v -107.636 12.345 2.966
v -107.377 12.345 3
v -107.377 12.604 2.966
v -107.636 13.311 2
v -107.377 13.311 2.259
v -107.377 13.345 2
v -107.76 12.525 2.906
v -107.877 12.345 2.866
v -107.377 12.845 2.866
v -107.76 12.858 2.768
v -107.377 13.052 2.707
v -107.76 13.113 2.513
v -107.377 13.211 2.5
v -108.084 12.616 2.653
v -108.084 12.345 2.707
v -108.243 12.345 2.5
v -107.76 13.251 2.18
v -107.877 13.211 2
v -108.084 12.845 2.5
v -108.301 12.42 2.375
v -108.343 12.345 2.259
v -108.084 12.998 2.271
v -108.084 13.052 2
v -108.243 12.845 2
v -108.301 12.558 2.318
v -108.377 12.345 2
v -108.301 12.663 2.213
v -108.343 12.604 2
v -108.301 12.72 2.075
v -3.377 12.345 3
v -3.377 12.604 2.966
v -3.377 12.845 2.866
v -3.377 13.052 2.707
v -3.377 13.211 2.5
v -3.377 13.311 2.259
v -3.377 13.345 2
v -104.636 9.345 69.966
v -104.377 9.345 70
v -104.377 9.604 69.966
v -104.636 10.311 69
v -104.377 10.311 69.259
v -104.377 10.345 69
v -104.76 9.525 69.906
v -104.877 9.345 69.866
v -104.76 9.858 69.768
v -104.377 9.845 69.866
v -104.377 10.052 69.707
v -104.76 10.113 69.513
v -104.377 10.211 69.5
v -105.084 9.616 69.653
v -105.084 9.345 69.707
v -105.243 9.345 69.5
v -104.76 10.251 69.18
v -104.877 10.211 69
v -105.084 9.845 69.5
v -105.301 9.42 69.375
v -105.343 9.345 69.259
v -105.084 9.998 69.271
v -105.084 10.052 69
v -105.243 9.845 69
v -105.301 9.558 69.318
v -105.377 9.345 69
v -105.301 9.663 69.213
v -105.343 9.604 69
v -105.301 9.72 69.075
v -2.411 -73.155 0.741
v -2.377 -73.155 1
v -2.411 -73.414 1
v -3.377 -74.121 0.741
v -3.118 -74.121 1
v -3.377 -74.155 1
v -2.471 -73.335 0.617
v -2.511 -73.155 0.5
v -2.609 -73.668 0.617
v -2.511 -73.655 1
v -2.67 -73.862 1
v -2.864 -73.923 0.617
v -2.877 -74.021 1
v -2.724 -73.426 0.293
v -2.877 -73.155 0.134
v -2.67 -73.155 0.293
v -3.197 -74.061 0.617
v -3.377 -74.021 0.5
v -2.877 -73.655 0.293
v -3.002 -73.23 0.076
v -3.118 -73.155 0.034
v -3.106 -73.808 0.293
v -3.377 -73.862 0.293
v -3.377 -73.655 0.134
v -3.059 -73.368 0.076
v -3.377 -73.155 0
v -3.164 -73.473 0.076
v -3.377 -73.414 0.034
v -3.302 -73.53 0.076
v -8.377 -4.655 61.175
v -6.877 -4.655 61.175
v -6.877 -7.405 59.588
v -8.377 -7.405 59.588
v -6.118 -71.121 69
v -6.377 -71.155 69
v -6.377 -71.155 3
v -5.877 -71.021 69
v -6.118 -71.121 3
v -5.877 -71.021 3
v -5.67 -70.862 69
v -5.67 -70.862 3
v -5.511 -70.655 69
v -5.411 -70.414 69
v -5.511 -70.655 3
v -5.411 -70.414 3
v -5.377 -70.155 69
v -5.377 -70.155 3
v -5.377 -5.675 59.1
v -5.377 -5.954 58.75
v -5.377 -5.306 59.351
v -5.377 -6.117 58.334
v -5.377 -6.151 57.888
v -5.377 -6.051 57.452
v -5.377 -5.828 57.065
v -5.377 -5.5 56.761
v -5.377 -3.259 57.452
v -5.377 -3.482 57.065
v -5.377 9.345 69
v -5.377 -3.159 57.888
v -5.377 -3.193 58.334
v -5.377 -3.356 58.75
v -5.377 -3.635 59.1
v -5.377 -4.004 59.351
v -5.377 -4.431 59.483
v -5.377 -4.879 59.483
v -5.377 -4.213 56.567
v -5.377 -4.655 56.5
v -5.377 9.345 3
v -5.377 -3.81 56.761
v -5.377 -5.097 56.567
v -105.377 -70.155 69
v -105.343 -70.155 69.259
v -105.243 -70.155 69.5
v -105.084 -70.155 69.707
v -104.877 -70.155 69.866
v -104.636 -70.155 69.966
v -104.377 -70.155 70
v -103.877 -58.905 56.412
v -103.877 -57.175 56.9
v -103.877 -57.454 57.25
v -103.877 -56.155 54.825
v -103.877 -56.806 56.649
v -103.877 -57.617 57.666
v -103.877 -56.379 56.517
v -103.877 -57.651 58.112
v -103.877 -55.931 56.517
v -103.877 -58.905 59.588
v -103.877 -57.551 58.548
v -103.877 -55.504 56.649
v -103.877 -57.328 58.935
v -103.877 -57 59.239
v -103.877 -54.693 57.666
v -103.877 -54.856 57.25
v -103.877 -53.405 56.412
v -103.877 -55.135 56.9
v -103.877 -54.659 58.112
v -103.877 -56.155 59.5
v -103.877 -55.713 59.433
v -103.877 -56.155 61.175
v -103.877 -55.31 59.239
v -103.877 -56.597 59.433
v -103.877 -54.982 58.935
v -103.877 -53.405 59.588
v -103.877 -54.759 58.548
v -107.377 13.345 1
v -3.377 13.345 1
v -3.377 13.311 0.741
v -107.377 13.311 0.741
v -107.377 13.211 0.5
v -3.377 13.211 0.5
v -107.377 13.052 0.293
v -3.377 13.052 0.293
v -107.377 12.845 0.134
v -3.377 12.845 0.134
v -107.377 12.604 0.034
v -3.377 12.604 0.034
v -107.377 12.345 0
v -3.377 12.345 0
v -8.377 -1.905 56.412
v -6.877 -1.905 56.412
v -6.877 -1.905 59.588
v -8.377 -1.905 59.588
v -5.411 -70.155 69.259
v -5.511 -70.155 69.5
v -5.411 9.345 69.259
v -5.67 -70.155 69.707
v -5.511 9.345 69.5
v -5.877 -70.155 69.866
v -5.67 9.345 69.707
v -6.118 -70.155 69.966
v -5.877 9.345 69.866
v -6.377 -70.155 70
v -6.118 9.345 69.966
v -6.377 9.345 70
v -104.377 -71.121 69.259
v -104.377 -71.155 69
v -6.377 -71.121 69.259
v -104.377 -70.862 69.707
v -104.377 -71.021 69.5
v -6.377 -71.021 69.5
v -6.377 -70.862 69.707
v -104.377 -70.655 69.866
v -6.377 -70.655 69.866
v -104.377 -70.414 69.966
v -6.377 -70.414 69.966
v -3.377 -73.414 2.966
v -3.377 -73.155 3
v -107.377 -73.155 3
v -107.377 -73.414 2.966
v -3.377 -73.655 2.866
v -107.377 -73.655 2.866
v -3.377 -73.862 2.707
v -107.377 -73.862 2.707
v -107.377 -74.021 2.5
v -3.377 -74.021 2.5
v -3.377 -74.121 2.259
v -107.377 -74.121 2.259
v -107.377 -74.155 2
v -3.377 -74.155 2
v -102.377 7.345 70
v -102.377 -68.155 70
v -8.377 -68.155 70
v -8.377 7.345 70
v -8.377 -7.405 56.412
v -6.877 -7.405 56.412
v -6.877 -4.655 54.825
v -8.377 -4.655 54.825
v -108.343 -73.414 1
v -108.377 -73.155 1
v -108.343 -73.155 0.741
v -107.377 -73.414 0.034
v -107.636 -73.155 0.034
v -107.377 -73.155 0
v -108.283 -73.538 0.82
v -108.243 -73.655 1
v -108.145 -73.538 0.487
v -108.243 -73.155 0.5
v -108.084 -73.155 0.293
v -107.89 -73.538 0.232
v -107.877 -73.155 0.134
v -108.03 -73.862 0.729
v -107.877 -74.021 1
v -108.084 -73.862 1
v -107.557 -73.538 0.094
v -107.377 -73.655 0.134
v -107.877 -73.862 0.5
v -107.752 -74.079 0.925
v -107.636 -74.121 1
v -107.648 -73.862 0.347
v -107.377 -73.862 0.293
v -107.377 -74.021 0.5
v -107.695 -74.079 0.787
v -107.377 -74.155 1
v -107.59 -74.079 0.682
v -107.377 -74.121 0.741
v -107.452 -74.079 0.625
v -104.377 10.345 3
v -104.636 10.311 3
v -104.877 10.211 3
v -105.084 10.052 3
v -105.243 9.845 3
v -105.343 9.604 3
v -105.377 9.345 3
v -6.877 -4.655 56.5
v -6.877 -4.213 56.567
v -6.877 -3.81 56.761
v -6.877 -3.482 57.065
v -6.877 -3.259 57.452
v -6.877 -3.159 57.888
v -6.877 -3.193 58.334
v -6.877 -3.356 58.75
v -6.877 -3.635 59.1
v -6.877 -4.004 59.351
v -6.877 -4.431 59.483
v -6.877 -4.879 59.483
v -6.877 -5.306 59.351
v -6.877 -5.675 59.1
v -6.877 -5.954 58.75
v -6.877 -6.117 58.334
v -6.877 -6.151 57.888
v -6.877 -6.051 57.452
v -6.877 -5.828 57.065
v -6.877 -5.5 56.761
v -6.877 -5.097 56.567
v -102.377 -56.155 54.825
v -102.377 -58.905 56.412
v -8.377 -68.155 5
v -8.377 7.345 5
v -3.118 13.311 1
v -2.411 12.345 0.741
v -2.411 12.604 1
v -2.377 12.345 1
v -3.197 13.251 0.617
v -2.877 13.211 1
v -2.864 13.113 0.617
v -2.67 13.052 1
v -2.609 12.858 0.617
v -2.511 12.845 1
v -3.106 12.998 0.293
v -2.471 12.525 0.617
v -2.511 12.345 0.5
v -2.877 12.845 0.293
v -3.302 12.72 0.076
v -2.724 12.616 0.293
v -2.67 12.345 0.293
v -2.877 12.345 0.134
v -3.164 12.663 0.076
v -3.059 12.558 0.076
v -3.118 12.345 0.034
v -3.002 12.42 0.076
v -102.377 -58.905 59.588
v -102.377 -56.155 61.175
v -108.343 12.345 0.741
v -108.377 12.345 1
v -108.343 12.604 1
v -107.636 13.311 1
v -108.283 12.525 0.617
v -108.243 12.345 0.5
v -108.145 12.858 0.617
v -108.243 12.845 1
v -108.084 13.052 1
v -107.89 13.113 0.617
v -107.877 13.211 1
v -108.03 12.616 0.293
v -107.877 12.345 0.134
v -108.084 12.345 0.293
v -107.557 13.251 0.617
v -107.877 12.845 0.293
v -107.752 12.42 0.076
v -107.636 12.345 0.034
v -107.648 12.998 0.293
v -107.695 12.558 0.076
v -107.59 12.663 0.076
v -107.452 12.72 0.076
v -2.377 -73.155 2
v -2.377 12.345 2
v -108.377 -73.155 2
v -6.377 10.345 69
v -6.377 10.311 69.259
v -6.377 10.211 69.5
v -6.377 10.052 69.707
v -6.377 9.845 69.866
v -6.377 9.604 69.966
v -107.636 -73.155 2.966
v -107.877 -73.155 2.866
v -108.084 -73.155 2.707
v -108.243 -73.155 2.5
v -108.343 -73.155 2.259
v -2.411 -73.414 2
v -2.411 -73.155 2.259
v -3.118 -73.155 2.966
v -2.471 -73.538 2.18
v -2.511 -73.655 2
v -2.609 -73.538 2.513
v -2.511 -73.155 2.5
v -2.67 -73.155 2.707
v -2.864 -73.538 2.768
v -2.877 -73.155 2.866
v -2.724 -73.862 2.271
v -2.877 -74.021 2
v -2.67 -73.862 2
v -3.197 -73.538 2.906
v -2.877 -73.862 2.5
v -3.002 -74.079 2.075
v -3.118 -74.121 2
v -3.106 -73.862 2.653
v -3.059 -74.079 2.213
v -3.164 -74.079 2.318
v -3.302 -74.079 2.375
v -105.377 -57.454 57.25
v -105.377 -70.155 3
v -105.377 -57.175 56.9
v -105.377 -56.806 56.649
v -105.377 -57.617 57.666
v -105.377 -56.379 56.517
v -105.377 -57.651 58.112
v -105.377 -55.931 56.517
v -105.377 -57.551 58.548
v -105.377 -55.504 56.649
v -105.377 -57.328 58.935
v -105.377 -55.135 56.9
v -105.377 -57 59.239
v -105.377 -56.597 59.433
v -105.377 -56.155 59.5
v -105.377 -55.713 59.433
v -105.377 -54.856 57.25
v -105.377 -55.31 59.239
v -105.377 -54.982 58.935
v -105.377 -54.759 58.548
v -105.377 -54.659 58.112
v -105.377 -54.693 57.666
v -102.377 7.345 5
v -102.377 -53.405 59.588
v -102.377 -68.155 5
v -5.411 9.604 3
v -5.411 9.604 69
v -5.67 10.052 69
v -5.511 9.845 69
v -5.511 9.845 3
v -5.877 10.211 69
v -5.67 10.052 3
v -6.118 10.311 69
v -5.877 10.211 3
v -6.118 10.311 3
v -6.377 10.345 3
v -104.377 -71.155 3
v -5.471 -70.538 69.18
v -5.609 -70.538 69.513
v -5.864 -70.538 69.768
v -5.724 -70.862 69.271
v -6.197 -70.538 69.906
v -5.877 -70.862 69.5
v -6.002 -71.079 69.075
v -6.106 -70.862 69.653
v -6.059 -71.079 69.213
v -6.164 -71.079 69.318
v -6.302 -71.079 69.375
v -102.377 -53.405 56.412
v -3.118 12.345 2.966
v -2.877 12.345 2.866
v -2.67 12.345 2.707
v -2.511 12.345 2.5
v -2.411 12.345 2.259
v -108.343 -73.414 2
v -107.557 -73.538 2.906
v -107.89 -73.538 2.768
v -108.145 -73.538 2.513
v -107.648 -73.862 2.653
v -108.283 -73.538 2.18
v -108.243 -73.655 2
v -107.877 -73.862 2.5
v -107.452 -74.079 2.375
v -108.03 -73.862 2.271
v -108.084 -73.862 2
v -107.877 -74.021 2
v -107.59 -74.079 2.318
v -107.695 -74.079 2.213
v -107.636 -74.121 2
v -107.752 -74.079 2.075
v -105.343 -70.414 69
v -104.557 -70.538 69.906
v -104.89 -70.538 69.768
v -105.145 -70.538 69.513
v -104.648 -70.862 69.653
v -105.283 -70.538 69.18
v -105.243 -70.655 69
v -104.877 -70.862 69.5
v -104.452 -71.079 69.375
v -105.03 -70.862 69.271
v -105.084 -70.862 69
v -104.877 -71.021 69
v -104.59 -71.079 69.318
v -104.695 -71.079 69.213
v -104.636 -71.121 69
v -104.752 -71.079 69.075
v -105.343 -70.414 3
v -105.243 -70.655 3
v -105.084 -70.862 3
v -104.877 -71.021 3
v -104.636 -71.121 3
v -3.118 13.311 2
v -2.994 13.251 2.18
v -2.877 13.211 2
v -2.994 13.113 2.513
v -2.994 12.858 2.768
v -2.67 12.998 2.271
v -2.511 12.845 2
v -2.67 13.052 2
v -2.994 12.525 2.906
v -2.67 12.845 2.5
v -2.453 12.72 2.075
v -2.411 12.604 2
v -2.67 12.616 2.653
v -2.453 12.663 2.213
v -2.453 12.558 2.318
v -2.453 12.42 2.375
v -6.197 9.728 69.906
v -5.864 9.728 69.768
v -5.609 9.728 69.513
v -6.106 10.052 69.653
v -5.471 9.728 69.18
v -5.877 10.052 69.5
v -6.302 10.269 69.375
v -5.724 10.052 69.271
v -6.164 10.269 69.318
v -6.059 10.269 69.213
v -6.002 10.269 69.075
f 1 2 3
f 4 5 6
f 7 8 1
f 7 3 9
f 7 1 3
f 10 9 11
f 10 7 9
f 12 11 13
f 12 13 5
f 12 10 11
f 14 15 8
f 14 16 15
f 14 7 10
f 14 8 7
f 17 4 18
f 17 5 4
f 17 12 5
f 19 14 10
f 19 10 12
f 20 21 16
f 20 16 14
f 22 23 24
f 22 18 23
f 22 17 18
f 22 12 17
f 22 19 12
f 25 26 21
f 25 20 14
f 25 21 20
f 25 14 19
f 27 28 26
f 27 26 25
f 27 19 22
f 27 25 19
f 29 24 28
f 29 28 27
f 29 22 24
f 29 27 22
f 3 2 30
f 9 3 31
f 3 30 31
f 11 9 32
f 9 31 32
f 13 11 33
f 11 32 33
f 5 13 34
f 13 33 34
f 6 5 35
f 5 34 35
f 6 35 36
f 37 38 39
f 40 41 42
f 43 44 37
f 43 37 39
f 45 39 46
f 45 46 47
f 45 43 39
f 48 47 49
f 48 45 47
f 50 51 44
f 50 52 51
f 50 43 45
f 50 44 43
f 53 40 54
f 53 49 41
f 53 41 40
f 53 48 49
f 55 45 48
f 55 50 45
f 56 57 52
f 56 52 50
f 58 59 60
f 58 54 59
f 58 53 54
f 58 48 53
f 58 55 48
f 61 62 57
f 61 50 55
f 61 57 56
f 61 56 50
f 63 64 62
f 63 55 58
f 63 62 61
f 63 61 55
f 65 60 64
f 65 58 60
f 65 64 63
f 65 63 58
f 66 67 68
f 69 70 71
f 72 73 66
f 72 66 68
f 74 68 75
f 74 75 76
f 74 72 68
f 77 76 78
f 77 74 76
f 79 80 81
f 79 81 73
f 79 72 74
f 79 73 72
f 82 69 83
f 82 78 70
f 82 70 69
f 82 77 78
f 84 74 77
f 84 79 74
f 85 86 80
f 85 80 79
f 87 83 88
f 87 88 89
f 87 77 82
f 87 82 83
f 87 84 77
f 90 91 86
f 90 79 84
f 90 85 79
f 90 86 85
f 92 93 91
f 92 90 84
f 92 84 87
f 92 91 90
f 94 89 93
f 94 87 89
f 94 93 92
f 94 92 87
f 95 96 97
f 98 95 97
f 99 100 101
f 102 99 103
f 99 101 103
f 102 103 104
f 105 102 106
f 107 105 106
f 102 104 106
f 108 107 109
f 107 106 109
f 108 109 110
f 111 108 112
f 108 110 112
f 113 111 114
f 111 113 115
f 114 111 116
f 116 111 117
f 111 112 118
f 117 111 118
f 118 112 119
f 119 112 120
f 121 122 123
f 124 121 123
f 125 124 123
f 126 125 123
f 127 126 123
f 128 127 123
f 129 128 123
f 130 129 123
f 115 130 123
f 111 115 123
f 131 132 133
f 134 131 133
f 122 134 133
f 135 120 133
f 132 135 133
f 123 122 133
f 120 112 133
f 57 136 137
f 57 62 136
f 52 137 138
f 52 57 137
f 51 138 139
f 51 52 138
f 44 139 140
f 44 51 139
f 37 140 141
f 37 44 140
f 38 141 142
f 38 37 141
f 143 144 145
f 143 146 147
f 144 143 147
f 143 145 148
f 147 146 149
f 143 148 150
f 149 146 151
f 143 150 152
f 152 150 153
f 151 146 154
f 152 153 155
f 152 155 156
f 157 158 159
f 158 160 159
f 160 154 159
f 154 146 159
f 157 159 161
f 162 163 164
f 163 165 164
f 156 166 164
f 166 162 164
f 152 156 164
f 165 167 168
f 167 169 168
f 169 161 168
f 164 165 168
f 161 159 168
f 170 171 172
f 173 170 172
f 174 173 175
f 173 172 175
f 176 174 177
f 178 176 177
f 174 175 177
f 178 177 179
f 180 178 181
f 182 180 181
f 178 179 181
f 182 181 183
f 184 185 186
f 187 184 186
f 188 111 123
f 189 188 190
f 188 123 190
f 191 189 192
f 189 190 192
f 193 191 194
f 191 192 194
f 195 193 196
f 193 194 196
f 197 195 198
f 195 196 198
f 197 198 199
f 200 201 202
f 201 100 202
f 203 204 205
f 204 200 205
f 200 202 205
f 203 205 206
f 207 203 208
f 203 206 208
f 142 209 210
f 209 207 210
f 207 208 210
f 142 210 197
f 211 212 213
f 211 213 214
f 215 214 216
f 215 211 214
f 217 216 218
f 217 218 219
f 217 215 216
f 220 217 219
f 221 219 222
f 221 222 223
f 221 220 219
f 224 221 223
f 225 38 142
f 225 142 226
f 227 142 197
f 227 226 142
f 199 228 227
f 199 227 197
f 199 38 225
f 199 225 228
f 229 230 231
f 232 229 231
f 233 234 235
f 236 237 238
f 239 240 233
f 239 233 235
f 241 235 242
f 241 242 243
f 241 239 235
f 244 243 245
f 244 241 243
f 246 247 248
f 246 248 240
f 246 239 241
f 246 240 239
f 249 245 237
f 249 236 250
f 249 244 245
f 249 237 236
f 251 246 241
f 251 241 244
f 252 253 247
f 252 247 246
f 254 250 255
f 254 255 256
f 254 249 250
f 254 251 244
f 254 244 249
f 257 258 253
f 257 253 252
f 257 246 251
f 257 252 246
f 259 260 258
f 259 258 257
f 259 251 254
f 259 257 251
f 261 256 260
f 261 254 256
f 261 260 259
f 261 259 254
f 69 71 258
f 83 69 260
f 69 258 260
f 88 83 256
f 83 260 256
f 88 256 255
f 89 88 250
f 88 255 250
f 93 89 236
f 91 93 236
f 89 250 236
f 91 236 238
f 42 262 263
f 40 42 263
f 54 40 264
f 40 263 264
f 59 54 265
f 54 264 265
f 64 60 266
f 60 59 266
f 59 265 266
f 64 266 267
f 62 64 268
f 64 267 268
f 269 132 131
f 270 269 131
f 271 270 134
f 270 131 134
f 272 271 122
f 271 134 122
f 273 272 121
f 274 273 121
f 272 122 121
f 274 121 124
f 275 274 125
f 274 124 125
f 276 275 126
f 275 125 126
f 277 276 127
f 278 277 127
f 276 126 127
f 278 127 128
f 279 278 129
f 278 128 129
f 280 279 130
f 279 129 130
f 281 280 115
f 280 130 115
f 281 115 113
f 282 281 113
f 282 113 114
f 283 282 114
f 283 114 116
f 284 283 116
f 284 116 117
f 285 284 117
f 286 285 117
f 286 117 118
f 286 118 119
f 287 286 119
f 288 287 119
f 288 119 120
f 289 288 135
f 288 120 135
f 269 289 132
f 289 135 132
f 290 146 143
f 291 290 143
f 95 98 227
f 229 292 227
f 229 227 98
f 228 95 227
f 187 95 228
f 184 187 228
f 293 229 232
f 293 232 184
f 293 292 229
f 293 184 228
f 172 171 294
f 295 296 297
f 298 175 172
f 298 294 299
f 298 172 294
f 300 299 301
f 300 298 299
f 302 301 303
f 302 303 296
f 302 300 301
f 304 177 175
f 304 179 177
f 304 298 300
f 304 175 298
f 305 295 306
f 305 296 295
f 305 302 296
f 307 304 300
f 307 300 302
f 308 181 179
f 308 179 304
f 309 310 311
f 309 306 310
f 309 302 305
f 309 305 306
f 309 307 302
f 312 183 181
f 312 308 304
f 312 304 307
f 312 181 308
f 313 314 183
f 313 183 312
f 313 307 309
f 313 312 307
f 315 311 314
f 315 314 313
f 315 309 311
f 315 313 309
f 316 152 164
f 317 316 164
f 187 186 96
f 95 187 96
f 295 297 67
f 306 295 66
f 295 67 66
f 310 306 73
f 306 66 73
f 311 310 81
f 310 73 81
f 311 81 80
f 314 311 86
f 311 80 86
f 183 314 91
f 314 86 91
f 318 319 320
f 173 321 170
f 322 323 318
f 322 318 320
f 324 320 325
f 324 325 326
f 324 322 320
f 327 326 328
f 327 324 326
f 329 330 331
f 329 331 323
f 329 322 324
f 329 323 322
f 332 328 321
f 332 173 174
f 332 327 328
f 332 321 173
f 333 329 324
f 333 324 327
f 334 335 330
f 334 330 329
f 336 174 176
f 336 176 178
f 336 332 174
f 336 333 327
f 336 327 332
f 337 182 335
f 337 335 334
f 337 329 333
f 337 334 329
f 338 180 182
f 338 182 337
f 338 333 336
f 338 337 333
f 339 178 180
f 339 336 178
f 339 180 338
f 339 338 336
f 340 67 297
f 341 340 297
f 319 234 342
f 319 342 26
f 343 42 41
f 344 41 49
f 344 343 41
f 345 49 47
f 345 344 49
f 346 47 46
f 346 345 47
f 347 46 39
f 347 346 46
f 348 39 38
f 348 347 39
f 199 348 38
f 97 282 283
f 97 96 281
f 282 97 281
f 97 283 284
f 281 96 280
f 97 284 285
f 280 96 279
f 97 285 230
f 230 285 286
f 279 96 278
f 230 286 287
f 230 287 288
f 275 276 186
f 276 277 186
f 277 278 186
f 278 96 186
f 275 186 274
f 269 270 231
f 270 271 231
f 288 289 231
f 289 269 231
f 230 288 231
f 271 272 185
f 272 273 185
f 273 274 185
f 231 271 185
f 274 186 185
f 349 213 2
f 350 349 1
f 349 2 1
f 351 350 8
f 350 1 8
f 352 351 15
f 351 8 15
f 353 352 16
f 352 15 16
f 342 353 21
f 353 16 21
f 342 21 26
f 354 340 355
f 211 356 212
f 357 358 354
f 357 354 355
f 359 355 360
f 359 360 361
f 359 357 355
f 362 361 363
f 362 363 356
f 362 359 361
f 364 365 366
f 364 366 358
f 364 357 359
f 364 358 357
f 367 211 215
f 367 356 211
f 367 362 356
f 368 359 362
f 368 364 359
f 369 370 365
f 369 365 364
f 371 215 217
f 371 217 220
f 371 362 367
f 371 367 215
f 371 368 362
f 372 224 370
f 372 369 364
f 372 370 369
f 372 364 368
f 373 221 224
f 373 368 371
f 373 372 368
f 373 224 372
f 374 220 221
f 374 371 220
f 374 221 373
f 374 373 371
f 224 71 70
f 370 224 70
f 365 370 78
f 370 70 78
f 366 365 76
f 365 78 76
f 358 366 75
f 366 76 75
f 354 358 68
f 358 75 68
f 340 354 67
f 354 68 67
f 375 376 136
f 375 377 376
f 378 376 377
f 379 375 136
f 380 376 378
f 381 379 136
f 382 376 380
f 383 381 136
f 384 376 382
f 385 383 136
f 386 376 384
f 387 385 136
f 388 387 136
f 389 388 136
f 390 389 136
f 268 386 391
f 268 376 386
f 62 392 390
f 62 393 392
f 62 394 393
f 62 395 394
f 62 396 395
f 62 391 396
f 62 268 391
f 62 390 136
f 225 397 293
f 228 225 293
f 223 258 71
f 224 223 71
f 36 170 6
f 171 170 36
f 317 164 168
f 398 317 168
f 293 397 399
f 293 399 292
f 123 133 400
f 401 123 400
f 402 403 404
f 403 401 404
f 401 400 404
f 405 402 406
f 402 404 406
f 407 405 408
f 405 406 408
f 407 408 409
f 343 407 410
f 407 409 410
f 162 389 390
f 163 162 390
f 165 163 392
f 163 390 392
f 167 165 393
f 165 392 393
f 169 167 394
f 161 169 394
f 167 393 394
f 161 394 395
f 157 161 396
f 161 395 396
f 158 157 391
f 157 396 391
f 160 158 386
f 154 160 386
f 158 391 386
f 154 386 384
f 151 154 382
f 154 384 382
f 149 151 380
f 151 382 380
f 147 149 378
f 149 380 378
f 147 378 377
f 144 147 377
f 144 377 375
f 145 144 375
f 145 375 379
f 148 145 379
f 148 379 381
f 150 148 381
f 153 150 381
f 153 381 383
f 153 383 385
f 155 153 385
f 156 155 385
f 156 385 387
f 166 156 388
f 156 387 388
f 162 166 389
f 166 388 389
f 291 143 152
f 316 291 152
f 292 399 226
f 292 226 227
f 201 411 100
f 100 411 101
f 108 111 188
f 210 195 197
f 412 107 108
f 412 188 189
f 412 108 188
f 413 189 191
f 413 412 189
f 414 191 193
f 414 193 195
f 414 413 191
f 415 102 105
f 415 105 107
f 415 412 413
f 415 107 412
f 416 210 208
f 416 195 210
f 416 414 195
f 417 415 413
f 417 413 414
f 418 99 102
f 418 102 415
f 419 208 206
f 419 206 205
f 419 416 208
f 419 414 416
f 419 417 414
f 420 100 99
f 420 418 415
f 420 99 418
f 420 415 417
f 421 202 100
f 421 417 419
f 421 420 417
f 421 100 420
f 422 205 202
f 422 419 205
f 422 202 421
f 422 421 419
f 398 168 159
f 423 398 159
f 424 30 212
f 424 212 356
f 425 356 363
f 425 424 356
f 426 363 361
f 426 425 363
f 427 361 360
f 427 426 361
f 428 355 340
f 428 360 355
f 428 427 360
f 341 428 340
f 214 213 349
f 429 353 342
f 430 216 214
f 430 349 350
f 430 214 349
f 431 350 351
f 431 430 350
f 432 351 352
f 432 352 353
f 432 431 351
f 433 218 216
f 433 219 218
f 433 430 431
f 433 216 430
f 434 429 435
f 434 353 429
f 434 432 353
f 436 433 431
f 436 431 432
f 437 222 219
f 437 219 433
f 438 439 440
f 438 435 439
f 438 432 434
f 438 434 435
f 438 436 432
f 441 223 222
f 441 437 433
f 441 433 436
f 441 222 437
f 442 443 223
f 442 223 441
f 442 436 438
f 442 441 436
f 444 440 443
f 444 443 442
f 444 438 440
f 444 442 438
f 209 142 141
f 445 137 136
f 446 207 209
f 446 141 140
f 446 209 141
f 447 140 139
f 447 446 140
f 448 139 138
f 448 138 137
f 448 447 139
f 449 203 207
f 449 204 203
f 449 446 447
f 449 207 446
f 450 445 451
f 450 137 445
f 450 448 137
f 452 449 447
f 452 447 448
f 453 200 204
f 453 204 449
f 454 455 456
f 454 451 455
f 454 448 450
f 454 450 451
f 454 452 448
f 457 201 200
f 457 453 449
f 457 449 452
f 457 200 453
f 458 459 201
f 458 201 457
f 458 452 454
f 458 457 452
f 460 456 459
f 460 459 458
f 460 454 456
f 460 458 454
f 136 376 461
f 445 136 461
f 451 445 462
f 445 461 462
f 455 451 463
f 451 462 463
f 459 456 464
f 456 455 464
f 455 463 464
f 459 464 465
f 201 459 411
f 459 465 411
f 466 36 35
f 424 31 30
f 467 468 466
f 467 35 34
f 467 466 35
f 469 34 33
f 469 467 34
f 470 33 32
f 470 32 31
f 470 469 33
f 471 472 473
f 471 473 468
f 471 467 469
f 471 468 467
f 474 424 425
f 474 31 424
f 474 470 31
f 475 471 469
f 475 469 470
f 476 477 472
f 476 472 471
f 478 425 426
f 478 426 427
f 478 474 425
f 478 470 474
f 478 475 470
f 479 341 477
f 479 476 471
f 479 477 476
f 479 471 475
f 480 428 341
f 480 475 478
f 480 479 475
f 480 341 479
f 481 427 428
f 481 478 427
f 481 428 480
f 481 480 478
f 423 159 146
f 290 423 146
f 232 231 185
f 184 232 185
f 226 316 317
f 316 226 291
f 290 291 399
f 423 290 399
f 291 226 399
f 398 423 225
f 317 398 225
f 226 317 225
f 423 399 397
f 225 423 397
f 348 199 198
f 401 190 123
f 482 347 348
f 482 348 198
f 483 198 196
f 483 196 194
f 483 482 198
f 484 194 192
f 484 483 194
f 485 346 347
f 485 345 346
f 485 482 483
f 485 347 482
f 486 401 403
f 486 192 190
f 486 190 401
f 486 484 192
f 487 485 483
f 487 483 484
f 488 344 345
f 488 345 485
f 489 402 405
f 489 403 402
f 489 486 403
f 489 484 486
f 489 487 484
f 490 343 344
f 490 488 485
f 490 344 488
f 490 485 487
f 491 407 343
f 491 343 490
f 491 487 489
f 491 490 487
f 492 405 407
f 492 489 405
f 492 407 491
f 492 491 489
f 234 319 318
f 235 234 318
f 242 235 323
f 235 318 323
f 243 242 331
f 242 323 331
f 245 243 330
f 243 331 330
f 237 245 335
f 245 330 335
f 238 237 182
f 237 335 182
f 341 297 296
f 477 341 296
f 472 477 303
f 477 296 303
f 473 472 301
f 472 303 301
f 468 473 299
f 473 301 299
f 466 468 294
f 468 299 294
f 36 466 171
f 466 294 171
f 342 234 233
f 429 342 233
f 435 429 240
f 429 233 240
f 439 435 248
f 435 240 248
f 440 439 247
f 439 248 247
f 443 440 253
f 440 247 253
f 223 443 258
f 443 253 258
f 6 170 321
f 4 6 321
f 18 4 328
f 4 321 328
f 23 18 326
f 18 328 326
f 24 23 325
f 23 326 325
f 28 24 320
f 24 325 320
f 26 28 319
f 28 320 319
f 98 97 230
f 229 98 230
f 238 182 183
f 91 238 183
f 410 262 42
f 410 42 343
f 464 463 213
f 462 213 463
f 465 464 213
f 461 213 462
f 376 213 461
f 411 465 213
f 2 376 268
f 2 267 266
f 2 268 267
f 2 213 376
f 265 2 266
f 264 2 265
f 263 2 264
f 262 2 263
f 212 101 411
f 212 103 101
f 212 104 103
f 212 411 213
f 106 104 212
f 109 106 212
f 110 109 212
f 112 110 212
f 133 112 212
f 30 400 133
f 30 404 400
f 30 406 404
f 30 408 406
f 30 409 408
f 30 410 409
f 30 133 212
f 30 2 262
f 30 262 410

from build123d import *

# Parameters (mm, degrees)
ESQUISSE1_W             = 106
ESQUISSE1_H             = 87.5
ESQUISSE1_W_2           = 100
ESQUISSE1_H_2           = 81.5
BOSS_EXTRU_1_DEPTH      = 3
ESQUISSE1_32_W          = 100
ESQUISSE1_32_H          = 81.5
ESQUISSE1_32_W_2        = 94
ESQUISSE1_32_H_2        = 75.5
BOSS_EXTRU_2_DEPTH      = 70
ESQUISSE1_33_W          = 94
ESQUISSE1_33_H          = 75.5
BOSS_EXTRU_3_DEPTH      = 5
CONG_1_R                = 1
CONG_2_R                = 1
CONG_3_R                = 1
ESQUISSE13_R            = 1.5
ENL_V_MAT_EXTRU_1_DEPTH = 3
ESQUISSE13_3_R          = 1.5
ENL_V_MAT_EXTRU_2_DEPTH = 3
ESQUISSE13_4_R          = 1.5
BOSS_EXTRU_6_DEPTH      = 1.5
ESQUISSE11_R            = 1.5
ENL_V_MAT_EXTRU_6_DEPTH = 3
ESQUISSE11_11_R         = 5
ESQUISSE11_11_R_2       = 1.5
BOSS_EXTRU_8_DEPTH      = 1.5
ESQUISSE11_12_R         = 1.5
ENL_V_MAT_EXTRU_7_DEPTH = 1.5
CONG_5_R                = 1


with BuildPart() as part:
    # Esquisse1 → Boss.-Extru.1 (new body)
    with BuildSketch(Plane.XY):
        with Locations((-55.377032771, -30.405018472)):
            Rectangle(ESQUISSE1_W, ESQUISSE1_H)
        with Locations((-55.377032771, -30.405018472)):
            Rectangle(ESQUISSE1_W_2, ESQUISSE1_H_2, mode=Mode.SUBTRACT)
    extrude(amount=BOSS_EXTRU_1_DEPTH)

    # Esquisse1<32> → Boss.-Extru.2 (add)
    with BuildSketch(Plane.XY):
        with Locations((-55.377032771, -30.405018472)):
            Rectangle(ESQUISSE1_32_W, ESQUISSE1_32_H)
        with Locations((-55.377032771, -30.405018472)):
            Rectangle(ESQUISSE1_32_W_2, ESQUISSE1_32_H_2, mode=Mode.SUBTRACT)
    extrude(amount=BOSS_EXTRU_2_DEPTH)

    # Esquisse1<33> → Boss.-Extru.3 (add)
    with BuildSketch(Plane.XY):
        with Locations((-55.377032771, -30.405018472)):
            Rectangle(ESQUISSE1_33_W, ESQUISSE1_33_H)
    extrude(amount=BOSS_EXTRU_3_DEPTH)

    # Congé1
    cong_1_edges = [part.edges().sort_by_distance(p)[0] for p in [
        (-55.377032771, 10.344981528, 70),
        (-105.377032771, -30.405018472, 70),
        (-55.377032771, -71.155018472, 70),
        (-5.377032771, -30.405018472, 70),
    ]]
    fillet(cong_1_edges, radius=CONG_1_R)

    # Congé2
    cong_2_edges = [part.edges().sort_by_distance(p)[0] for p in [
        (-55.377032771, -74.155018472, 3),
        (-2.377032771, -30.405018472, 3),
        (-55.377032771, 13.344981528, 3),
        (-108.377032771, -30.405018472, 3),
    ]]
    fillet(cong_2_edges, radius=CONG_2_R)

    # Congé3
    # the kernel refuses this fillet: 1 mm, written as the material it takes off along each edge
    with BuildSketch(Plane(origin=(-107.377032771, -73.155018472, 2), x_dir=(-1, 0, 0), z_dir=(0, -1, 0))) as cong_3_piece_1_section:
        Polygon((0, 0), (CONG_3_R, 0), (CONG_3_R, -CONG_3_R), (0, -CONG_3_R), align=None)
    cong_3_piece_1 = extrude(amount=CONG_3_R, mode=Mode.PRIVATE)
    cong_3_piece_1 = cong_3_piece_1 - Plane(origin=(-107.377032771, -73.155018472, 2), x_dir=(0.7071067811865475, 0, -0.7071067811865475), z_dir=(0, -1, 0)) * Sphere(CONG_3_R, mode=Mode.PRIVATE)
    add(cong_3_piece_1, mode=Mode.SUBTRACT)
    with BuildSketch(Plane(origin=(-107.377032771, 12.344981528, 2), x_dir=(0, 1, 0), z_dir=(-1, 0, 0))) as cong_3_piece_2_section:
        Polygon((0, 0), (CONG_3_R, 0), (CONG_3_R, -CONG_3_R), (0, -CONG_3_R), align=None)
    cong_3_piece_2 = extrude(amount=CONG_3_R, mode=Mode.PRIVATE)
    cong_3_piece_2 = cong_3_piece_2 - Plane(origin=(-107.377032771, 12.344981528, 2), x_dir=(0, -0.7071067811865475, -0.7071067811865475), z_dir=(-1, 0, 0)) * Sphere(CONG_3_R, mode=Mode.PRIVATE)
    add(cong_3_piece_2, mode=Mode.SUBTRACT)
    with BuildSketch(Plane(origin=(-3.377032771, -73.155018472, 2), x_dir=(1, 0, 0), z_dir=(0, -1, 0))) as cong_3_piece_3_section:
        Polygon((0, 0), (CONG_3_R, 0), (CONG_3_R, CONG_3_R), (0, CONG_3_R), align=None)
    cong_3_piece_3 = extrude(amount=CONG_3_R, mode=Mode.PRIVATE)
    cong_3_piece_3 = cong_3_piece_3 - Plane(origin=(-3.377032771, -73.155018472, 2), x_dir=(-0.7071067811865475, 0, -0.7071067811865475), z_dir=(0, -1, 0)) * Sphere(CONG_3_R, mode=Mode.PRIVATE)
    add(cong_3_piece_3, mode=Mode.SUBTRACT)
    with BuildSketch(Plane(origin=(-3.377032771, 12.344981528, 2), x_dir=(0, 1, 0), z_dir=(1, 0, 0))) as cong_3_piece_4_section:
        Polygon((0, 0), (CONG_3_R, 0), (CONG_3_R, CONG_3_R), (0, CONG_3_R), align=None)
    cong_3_piece_4 = extrude(amount=CONG_3_R, mode=Mode.PRIVATE)
    cong_3_piece_4 = cong_3_piece_4 - Plane(origin=(-3.377032771, 12.344981528, 2), x_dir=(0, -0.7071067811865475, -0.7071067811865475), z_dir=(1, 0, 0)) * Sphere(CONG_3_R, mode=Mode.PRIVATE)
    add(cong_3_piece_4, mode=Mode.SUBTRACT)
    with BuildSketch(Plane(origin=(-3.377032771, -73.155018472, 1), x_dir=(1, 0, 0), z_dir=(0, 0, -1))) as cong_3_piece_5_section:
        Polygon((0, 0), (CONG_3_R, 0), (CONG_3_R, CONG_3_R), (0, CONG_3_R), align=None)
    cong_3_piece_5 = extrude(amount=CONG_3_R, mode=Mode.PRIVATE)
    cong_3_piece_5 = cong_3_piece_5 - Plane(origin=(-3.377032771, -73.155018472, 1), x_dir=(-0.7071067811865475, 0.7071067811865475, 0), z_dir=(0, 0, -1)) * Sphere(CONG_3_R, mode=Mode.PRIVATE)
    add(cong_3_piece_5, mode=Mode.SUBTRACT)
    with BuildSketch(Plane(origin=(-3.377032771, 12.344981528, 1), x_dir=(1, 0, 0), z_dir=(0, 0, -1))) as cong_3_piece_6_section:
        Polygon((0, 0), (CONG_3_R, 0), (CONG_3_R, -CONG_3_R), (0, -CONG_3_R), align=None)
    cong_3_piece_6 = extrude(amount=CONG_3_R, mode=Mode.PRIVATE)
    cong_3_piece_6 = cong_3_piece_6 - Plane(origin=(-3.377032771, 12.344981528, 1), x_dir=(-0.7071067811865475, -0.7071067811865475, 0), z_dir=(0, 0, -1)) * Sphere(CONG_3_R, mode=Mode.PRIVATE)
    add(cong_3_piece_6, mode=Mode.SUBTRACT)
    with BuildSketch(Plane(origin=(-107.377032771, -73.155018472, 1), x_dir=(-1, 0, 0), z_dir=(0, -1, 0))) as cong_3_piece_7_section:
        Polygon((0, 0), (CONG_3_R, 0), (CONG_3_R, CONG_3_R), (0, CONG_3_R), align=None)
    cong_3_piece_7 = extrude(amount=CONG_3_R, mode=Mode.PRIVATE)
    cong_3_piece_7 = cong_3_piece_7 - Plane(origin=(-107.377032771, -73.155018472, 1), x_dir=(0.7071067811865475, 0, 0.7071067811865475), z_dir=(0, -1, 0)) * Sphere(CONG_3_R, mode=Mode.PRIVATE)
    add(cong_3_piece_7, mode=Mode.SUBTRACT)
    with BuildSketch(Plane(origin=(-107.377032771, 12.344981528, 1), x_dir=(-1, 0, 0), z_dir=(0, 0, -1))) as cong_3_piece_8_section:
        Polygon((0, 0), (CONG_3_R, 0), (CONG_3_R, CONG_3_R), (0, CONG_3_R), align=None)
    cong_3_piece_8 = extrude(amount=CONG_3_R, mode=Mode.PRIVATE)
    cong_3_piece_8 = cong_3_piece_8 - Plane(origin=(-107.377032771, 12.344981528, 1), x_dir=(0.7071067811865475, -0.7071067811865475, 0), z_dir=(0, 0, -1)) * Sphere(CONG_3_R, mode=Mode.PRIVATE)
    add(cong_3_piece_8, mode=Mode.SUBTRACT)
    with BuildSketch(Plane(origin=(-2.377032771, -73.155018472, 0), x_dir=(0, 0, 1), z_dir=(0, 1, 0)), Plane(origin=(-108.377032771, 12.344981528, 0), x_dir=(0, 0, 1), z_dir=(0, -1, 0))) as cong_3_piece_9:
        with BuildLine():
            CenterArc((CONG_3_R, -CONG_3_R), CONG_3_R, 90, 90)
            Line((0, -CONG_3_R), (0, 0))
            Line((0, 0), (CONG_3_R, 0))
        make_face()
    extrude(amount=85.5, mode=Mode.SUBTRACT)
    with BuildSketch(Plane(origin=(-107.377032771, -74.155018472, 0), x_dir=(0, 0, 1), z_dir=(1, 0, 0)), Plane(origin=(-3.377032771, 13.344981528, 0), x_dir=(0, 0, 1), z_dir=(-1, 0, 0))) as cong_3_piece_10:
        with BuildLine():
            CenterArc((CONG_3_R, -CONG_3_R), CONG_3_R, 90, 90)
            Line((0, -CONG_3_R), (0, 0))
            Line((0, 0), (CONG_3_R, 0))
        make_face()
    extrude(amount=104, mode=Mode.SUBTRACT)
    with BuildSketch(Plane(origin=(-2.377032771, 13.344981528, 1), x_dir=(0, -1, 0), z_dir=(0, 0, 1)), Plane(origin=(-2.377032771, -74.155018472, 1), x_dir=(-1, 0, 0), z_dir=(0, 0, 1))) as cong_3_piece_11:
        with BuildLine():
            CenterArc((CONG_3_R, -CONG_3_R), CONG_3_R, 90, 90)
            Line((0, -CONG_3_R), (0, 0))
            Line((0, 0), (CONG_3_R, 0))
        make_face()
    extrude(amount=1, mode=Mode.SUBTRACT)
    with BuildSketch(Plane(origin=(-108.377032771, 13.344981528, 1), x_dir=(0, -1, 0), z_dir=(0, 0, 1)), Plane(origin=(-108.377032771, -74.155018472, 1), x_dir=(1, 0, 0), z_dir=(0, 0, 1))) as cong_3_piece_12:
        with BuildLine():
            CenterArc((CONG_3_R, CONG_3_R), CONG_3_R, 180, 90)
            Line((0, CONG_3_R), (0, 0))
            Line((0, 0), (CONG_3_R, 0))
        make_face()
    extrude(amount=1, mode=Mode.SUBTRACT)

    # Esquisse13 → Enlèv. mat.-Extru.1 (cut)
    with BuildSketch(Plane.ZY.offset(105.377032771)):
        with Locations((58, -56.155018472)):
            Circle(ESQUISSE13_R)
    extrude(amount=-ENL_V_MAT_EXTRU_1_DEPTH, mode=Mode.SUBTRACT)

    # Esquisse13<3> → Enlèv. mat.-Extru.2 (cut)
    with BuildSketch(Plane.ZY.offset(105.377032771)):
        Polygon((56.41228676, -58.905018472), (59.58771324, -58.905018472), (61.175426481, -56.155018472), (59.58771324, -53.405018472), (56.41228676, -53.405018472), (54.824573519, -56.155018472), align=None)
        with Locations((58, -56.155018472)):
            Circle(ESQUISSE13_3_R, mode=Mode.SUBTRACT)
    extrude(amount=-ENL_V_MAT_EXTRU_2_DEPTH, mode=Mode.SUBTRACT)

    # Esquisse13<4> → Boss.-Extru.6 (add)
    with BuildSketch(Plane.ZY.offset(105.377032771)):
        Polygon((56.41228676, -58.905018472), (59.58771324, -58.905018472), (61.175426481, -56.155018472), (59.58771324, -53.405018472), (56.41228676, -53.405018472), (54.824573519, -56.155018472), align=None)
        with Locations((58, -56.155018472)):
            Circle(ESQUISSE13_4_R, mode=Mode.SUBTRACT)
    extrude(amount=-BOSS_EXTRU_6_DEPTH)

    # Esquisse11 → Enlèv. mat.-Extru.6 (cut)
    # profile 1 of 2: a face of its own
    with BuildSketch(Plane(origin=(-5.377032771, 0, 0), x_dir=(0, 0, -1), z_dir=(1, 0, 0))):
        Polygon((-59.58771324, -7.405018472), (-56.41228676, -7.405018472), (-54.824573519, -4.655018472), (-56.41228676, -1.905018472), (-59.58771324, -1.905018472), (-61.175426481, -4.655018472), align=None)
        with Locations((-58, -4.655018472)):
            Circle(ESQUISSE11_R, mode=Mode.SUBTRACT)
    # profile 2 of 2: a face of its own
    with BuildSketch(Plane(origin=(-5.377032771, 0, 0), x_dir=(0, 0, -1), z_dir=(1, 0, 0))):
        with Locations((-58, -4.655018472)):
            Circle(ESQUISSE11_R)
    extrude(amount=-ENL_V_MAT_EXTRU_6_DEPTH, mode=Mode.SUBTRACT)

    # Esquisse11<11> → Boss.-Extru.8 (add)
    # profile 1 of 3: a face of its own
    with BuildSketch(Plane(origin=(-5.377032771, 0, 0), x_dir=(0, 0, -1), z_dir=(1, 0, 0))):
        with Locations((-58, -4.655018472)):
            Circle(ESQUISSE11_11_R)
        Polygon((-56.41228676, -7.405018472), (-54.824573519, -4.655018472), (-56.41228676, -1.905018472), (-59.58771324, -1.905018472), (-61.175426481, -4.655018472), (-59.58771324, -7.405018472), align=None, mode=Mode.SUBTRACT)
    # profile 2 of 3: a face of its own
    with BuildSketch(Plane(origin=(-5.377032771, 0, 0), x_dir=(0, 0, -1), z_dir=(1, 0, 0))):
        Polygon((-59.58771324, -7.405018472), (-56.41228676, -7.405018472), (-54.824573519, -4.655018472), (-56.41228676, -1.905018472), (-59.58771324, -1.905018472), (-61.175426481, -4.655018472), align=None)
        with Locations((-58, -4.655018472)):
            Circle(ESQUISSE11_11_R_2, mode=Mode.SUBTRACT)
    # profile 3 of 3: a face of its own
    with BuildSketch(Plane(origin=(-5.377032771, 0, 0), x_dir=(0, 0, -1), z_dir=(1, 0, 0))):
        with Locations((-58, -4.655018472)):
            Circle(ESQUISSE11_11_R_2)
    extrude(amount=-BOSS_EXTRU_8_DEPTH)

    # Esquisse11<12> → Enlèv. mat.-Extru.7 (cut)
    with BuildSketch(Plane(origin=(-5.377032771, 0, 0), x_dir=(0, 0, -1), z_dir=(1, 0, 0))):
        with Locations((-58, -4.655018472)):
            Circle(ESQUISSE11_12_R)
    extrude(amount=-ENL_V_MAT_EXTRU_7_DEPTH, mode=Mode.SUBTRACT)

    # Congé5
    # the kernel refuses this fillet: 1 mm, written as the material it takes off along each edge
    with BuildSketch(Plane(origin=(-104.377032771, 9.344981528, 69), x_dir=(0, 1, 0), z_dir=(-1, 0, 0))) as cong_5_piece_1_section:
        Polygon((0, 0), (CONG_5_R, 0), (CONG_5_R, -CONG_5_R), (0, -CONG_5_R), align=None)
    cong_5_piece_1 = extrude(amount=CONG_5_R, mode=Mode.PRIVATE)
    cong_5_piece_1 = cong_5_piece_1 - Plane(origin=(-104.377032771, 9.344981528, 69), x_dir=(0, -0.7071067811865475, -0.7071067811865475), z_dir=(-1, 0, 0)) * Sphere(CONG_5_R, mode=Mode.PRIVATE)
    with BuildSketch(Plane(origin=(-6.377032771, 9.344981528, 69), x_dir=(1, 0, 0), z_dir=(0, 1, 0))) as cong_5_piece_2_section:
        Polygon((0, 0), (CONG_5_R, 0), (CONG_5_R, -CONG_5_R), (0, -CONG_5_R), align=None)
    cong_5_piece_2 = extrude(amount=CONG_5_R, mode=Mode.PRIVATE)
    cong_5_piece_2 = cong_5_piece_2 - Plane(origin=(-6.377032771, 9.344981528, 69), x_dir=(-0.7071067811865475, 0, -0.7071067811865475), z_dir=(0, 1, 0)) * Sphere(CONG_5_R, mode=Mode.PRIVATE)
    with BuildSketch(Plane(origin=(-104.377032771, -70.155018472, 69), x_dir=(-1, 0, 0), z_dir=(0, -1, 0))) as cong_5_piece_3_section:
        Polygon((0, 0), (CONG_5_R, 0), (CONG_5_R, -CONG_5_R), (0, -CONG_5_R), align=None)
    cong_5_piece_3 = extrude(amount=CONG_5_R, mode=Mode.PRIVATE)
    cong_5_piece_3 = cong_5_piece_3 - Plane(origin=(-104.377032771, -70.155018472, 69), x_dir=(0.7071067811865475, 0, -0.7071067811865475), z_dir=(0, -1, 0)) * Sphere(CONG_5_R, mode=Mode.PRIVATE)
    with BuildSketch(Plane(origin=(-6.377032771, -70.155018472, 69), x_dir=(1, 0, 0), z_dir=(0, -1, 0))) as cong_5_piece_4_section:
        Polygon((0, 0), (CONG_5_R, 0), (CONG_5_R, CONG_5_R), (0, CONG_5_R), align=None)
    cong_5_piece_4 = extrude(amount=CONG_5_R, mode=Mode.PRIVATE)
    cong_5_piece_4 = cong_5_piece_4 - Plane(origin=(-6.377032771, -70.155018472, 69), x_dir=(-0.7071067811865475, 0, -0.7071067811865475), z_dir=(0, -1, 0)) * Sphere(CONG_5_R, mode=Mode.PRIVATE)
    with BuildSketch(Plane(origin=(-5.377032771, -71.155018472, 3), x_dir=(-1, 0, 0), z_dir=(0, 0, 1))) as cong_5_piece_5:
        with BuildLine():
            CenterArc((CONG_5_R, -CONG_5_R), CONG_5_R, 90, 90)
            Line((0, -CONG_5_R), (0, 0))
            Line((0, 0), (CONG_5_R, 0))
        make_face()
    cong_5_piece_5_solid = extrude(amount=66, mode=Mode.PRIVATE)
    with BuildSketch(Plane(origin=(-105.377032771, -71.155018472, 3), x_dir=(1, 0, 0), z_dir=(0, 0, 1)), Plane(origin=(-5.377032771, 10.344981528, 3), x_dir=(-1, 0, 0), z_dir=(0, 0, 1)), Plane(origin=(-105.377032771, 10.344981528, 3), x_dir=(0, -1, 0), z_dir=(0, 0, 1))) as cong_5_piece_6:
        with BuildLine():
            CenterArc((CONG_5_R, CONG_5_R), CONG_5_R, 180, 90)
            Line((0, CONG_5_R), (0, 0))
            Line((0, 0), (CONG_5_R, 0))
        make_face()
    cong_5_piece_6_solid = extrude(amount=66, mode=Mode.PRIVATE)
    add([cong_5_piece_1, cong_5_piece_2, cong_5_piece_3, cong_5_piece_4, cong_5_piece_5_solid, cong_5_piece_6_solid], mode=Mode.SUBTRACT)


solid = part.part
